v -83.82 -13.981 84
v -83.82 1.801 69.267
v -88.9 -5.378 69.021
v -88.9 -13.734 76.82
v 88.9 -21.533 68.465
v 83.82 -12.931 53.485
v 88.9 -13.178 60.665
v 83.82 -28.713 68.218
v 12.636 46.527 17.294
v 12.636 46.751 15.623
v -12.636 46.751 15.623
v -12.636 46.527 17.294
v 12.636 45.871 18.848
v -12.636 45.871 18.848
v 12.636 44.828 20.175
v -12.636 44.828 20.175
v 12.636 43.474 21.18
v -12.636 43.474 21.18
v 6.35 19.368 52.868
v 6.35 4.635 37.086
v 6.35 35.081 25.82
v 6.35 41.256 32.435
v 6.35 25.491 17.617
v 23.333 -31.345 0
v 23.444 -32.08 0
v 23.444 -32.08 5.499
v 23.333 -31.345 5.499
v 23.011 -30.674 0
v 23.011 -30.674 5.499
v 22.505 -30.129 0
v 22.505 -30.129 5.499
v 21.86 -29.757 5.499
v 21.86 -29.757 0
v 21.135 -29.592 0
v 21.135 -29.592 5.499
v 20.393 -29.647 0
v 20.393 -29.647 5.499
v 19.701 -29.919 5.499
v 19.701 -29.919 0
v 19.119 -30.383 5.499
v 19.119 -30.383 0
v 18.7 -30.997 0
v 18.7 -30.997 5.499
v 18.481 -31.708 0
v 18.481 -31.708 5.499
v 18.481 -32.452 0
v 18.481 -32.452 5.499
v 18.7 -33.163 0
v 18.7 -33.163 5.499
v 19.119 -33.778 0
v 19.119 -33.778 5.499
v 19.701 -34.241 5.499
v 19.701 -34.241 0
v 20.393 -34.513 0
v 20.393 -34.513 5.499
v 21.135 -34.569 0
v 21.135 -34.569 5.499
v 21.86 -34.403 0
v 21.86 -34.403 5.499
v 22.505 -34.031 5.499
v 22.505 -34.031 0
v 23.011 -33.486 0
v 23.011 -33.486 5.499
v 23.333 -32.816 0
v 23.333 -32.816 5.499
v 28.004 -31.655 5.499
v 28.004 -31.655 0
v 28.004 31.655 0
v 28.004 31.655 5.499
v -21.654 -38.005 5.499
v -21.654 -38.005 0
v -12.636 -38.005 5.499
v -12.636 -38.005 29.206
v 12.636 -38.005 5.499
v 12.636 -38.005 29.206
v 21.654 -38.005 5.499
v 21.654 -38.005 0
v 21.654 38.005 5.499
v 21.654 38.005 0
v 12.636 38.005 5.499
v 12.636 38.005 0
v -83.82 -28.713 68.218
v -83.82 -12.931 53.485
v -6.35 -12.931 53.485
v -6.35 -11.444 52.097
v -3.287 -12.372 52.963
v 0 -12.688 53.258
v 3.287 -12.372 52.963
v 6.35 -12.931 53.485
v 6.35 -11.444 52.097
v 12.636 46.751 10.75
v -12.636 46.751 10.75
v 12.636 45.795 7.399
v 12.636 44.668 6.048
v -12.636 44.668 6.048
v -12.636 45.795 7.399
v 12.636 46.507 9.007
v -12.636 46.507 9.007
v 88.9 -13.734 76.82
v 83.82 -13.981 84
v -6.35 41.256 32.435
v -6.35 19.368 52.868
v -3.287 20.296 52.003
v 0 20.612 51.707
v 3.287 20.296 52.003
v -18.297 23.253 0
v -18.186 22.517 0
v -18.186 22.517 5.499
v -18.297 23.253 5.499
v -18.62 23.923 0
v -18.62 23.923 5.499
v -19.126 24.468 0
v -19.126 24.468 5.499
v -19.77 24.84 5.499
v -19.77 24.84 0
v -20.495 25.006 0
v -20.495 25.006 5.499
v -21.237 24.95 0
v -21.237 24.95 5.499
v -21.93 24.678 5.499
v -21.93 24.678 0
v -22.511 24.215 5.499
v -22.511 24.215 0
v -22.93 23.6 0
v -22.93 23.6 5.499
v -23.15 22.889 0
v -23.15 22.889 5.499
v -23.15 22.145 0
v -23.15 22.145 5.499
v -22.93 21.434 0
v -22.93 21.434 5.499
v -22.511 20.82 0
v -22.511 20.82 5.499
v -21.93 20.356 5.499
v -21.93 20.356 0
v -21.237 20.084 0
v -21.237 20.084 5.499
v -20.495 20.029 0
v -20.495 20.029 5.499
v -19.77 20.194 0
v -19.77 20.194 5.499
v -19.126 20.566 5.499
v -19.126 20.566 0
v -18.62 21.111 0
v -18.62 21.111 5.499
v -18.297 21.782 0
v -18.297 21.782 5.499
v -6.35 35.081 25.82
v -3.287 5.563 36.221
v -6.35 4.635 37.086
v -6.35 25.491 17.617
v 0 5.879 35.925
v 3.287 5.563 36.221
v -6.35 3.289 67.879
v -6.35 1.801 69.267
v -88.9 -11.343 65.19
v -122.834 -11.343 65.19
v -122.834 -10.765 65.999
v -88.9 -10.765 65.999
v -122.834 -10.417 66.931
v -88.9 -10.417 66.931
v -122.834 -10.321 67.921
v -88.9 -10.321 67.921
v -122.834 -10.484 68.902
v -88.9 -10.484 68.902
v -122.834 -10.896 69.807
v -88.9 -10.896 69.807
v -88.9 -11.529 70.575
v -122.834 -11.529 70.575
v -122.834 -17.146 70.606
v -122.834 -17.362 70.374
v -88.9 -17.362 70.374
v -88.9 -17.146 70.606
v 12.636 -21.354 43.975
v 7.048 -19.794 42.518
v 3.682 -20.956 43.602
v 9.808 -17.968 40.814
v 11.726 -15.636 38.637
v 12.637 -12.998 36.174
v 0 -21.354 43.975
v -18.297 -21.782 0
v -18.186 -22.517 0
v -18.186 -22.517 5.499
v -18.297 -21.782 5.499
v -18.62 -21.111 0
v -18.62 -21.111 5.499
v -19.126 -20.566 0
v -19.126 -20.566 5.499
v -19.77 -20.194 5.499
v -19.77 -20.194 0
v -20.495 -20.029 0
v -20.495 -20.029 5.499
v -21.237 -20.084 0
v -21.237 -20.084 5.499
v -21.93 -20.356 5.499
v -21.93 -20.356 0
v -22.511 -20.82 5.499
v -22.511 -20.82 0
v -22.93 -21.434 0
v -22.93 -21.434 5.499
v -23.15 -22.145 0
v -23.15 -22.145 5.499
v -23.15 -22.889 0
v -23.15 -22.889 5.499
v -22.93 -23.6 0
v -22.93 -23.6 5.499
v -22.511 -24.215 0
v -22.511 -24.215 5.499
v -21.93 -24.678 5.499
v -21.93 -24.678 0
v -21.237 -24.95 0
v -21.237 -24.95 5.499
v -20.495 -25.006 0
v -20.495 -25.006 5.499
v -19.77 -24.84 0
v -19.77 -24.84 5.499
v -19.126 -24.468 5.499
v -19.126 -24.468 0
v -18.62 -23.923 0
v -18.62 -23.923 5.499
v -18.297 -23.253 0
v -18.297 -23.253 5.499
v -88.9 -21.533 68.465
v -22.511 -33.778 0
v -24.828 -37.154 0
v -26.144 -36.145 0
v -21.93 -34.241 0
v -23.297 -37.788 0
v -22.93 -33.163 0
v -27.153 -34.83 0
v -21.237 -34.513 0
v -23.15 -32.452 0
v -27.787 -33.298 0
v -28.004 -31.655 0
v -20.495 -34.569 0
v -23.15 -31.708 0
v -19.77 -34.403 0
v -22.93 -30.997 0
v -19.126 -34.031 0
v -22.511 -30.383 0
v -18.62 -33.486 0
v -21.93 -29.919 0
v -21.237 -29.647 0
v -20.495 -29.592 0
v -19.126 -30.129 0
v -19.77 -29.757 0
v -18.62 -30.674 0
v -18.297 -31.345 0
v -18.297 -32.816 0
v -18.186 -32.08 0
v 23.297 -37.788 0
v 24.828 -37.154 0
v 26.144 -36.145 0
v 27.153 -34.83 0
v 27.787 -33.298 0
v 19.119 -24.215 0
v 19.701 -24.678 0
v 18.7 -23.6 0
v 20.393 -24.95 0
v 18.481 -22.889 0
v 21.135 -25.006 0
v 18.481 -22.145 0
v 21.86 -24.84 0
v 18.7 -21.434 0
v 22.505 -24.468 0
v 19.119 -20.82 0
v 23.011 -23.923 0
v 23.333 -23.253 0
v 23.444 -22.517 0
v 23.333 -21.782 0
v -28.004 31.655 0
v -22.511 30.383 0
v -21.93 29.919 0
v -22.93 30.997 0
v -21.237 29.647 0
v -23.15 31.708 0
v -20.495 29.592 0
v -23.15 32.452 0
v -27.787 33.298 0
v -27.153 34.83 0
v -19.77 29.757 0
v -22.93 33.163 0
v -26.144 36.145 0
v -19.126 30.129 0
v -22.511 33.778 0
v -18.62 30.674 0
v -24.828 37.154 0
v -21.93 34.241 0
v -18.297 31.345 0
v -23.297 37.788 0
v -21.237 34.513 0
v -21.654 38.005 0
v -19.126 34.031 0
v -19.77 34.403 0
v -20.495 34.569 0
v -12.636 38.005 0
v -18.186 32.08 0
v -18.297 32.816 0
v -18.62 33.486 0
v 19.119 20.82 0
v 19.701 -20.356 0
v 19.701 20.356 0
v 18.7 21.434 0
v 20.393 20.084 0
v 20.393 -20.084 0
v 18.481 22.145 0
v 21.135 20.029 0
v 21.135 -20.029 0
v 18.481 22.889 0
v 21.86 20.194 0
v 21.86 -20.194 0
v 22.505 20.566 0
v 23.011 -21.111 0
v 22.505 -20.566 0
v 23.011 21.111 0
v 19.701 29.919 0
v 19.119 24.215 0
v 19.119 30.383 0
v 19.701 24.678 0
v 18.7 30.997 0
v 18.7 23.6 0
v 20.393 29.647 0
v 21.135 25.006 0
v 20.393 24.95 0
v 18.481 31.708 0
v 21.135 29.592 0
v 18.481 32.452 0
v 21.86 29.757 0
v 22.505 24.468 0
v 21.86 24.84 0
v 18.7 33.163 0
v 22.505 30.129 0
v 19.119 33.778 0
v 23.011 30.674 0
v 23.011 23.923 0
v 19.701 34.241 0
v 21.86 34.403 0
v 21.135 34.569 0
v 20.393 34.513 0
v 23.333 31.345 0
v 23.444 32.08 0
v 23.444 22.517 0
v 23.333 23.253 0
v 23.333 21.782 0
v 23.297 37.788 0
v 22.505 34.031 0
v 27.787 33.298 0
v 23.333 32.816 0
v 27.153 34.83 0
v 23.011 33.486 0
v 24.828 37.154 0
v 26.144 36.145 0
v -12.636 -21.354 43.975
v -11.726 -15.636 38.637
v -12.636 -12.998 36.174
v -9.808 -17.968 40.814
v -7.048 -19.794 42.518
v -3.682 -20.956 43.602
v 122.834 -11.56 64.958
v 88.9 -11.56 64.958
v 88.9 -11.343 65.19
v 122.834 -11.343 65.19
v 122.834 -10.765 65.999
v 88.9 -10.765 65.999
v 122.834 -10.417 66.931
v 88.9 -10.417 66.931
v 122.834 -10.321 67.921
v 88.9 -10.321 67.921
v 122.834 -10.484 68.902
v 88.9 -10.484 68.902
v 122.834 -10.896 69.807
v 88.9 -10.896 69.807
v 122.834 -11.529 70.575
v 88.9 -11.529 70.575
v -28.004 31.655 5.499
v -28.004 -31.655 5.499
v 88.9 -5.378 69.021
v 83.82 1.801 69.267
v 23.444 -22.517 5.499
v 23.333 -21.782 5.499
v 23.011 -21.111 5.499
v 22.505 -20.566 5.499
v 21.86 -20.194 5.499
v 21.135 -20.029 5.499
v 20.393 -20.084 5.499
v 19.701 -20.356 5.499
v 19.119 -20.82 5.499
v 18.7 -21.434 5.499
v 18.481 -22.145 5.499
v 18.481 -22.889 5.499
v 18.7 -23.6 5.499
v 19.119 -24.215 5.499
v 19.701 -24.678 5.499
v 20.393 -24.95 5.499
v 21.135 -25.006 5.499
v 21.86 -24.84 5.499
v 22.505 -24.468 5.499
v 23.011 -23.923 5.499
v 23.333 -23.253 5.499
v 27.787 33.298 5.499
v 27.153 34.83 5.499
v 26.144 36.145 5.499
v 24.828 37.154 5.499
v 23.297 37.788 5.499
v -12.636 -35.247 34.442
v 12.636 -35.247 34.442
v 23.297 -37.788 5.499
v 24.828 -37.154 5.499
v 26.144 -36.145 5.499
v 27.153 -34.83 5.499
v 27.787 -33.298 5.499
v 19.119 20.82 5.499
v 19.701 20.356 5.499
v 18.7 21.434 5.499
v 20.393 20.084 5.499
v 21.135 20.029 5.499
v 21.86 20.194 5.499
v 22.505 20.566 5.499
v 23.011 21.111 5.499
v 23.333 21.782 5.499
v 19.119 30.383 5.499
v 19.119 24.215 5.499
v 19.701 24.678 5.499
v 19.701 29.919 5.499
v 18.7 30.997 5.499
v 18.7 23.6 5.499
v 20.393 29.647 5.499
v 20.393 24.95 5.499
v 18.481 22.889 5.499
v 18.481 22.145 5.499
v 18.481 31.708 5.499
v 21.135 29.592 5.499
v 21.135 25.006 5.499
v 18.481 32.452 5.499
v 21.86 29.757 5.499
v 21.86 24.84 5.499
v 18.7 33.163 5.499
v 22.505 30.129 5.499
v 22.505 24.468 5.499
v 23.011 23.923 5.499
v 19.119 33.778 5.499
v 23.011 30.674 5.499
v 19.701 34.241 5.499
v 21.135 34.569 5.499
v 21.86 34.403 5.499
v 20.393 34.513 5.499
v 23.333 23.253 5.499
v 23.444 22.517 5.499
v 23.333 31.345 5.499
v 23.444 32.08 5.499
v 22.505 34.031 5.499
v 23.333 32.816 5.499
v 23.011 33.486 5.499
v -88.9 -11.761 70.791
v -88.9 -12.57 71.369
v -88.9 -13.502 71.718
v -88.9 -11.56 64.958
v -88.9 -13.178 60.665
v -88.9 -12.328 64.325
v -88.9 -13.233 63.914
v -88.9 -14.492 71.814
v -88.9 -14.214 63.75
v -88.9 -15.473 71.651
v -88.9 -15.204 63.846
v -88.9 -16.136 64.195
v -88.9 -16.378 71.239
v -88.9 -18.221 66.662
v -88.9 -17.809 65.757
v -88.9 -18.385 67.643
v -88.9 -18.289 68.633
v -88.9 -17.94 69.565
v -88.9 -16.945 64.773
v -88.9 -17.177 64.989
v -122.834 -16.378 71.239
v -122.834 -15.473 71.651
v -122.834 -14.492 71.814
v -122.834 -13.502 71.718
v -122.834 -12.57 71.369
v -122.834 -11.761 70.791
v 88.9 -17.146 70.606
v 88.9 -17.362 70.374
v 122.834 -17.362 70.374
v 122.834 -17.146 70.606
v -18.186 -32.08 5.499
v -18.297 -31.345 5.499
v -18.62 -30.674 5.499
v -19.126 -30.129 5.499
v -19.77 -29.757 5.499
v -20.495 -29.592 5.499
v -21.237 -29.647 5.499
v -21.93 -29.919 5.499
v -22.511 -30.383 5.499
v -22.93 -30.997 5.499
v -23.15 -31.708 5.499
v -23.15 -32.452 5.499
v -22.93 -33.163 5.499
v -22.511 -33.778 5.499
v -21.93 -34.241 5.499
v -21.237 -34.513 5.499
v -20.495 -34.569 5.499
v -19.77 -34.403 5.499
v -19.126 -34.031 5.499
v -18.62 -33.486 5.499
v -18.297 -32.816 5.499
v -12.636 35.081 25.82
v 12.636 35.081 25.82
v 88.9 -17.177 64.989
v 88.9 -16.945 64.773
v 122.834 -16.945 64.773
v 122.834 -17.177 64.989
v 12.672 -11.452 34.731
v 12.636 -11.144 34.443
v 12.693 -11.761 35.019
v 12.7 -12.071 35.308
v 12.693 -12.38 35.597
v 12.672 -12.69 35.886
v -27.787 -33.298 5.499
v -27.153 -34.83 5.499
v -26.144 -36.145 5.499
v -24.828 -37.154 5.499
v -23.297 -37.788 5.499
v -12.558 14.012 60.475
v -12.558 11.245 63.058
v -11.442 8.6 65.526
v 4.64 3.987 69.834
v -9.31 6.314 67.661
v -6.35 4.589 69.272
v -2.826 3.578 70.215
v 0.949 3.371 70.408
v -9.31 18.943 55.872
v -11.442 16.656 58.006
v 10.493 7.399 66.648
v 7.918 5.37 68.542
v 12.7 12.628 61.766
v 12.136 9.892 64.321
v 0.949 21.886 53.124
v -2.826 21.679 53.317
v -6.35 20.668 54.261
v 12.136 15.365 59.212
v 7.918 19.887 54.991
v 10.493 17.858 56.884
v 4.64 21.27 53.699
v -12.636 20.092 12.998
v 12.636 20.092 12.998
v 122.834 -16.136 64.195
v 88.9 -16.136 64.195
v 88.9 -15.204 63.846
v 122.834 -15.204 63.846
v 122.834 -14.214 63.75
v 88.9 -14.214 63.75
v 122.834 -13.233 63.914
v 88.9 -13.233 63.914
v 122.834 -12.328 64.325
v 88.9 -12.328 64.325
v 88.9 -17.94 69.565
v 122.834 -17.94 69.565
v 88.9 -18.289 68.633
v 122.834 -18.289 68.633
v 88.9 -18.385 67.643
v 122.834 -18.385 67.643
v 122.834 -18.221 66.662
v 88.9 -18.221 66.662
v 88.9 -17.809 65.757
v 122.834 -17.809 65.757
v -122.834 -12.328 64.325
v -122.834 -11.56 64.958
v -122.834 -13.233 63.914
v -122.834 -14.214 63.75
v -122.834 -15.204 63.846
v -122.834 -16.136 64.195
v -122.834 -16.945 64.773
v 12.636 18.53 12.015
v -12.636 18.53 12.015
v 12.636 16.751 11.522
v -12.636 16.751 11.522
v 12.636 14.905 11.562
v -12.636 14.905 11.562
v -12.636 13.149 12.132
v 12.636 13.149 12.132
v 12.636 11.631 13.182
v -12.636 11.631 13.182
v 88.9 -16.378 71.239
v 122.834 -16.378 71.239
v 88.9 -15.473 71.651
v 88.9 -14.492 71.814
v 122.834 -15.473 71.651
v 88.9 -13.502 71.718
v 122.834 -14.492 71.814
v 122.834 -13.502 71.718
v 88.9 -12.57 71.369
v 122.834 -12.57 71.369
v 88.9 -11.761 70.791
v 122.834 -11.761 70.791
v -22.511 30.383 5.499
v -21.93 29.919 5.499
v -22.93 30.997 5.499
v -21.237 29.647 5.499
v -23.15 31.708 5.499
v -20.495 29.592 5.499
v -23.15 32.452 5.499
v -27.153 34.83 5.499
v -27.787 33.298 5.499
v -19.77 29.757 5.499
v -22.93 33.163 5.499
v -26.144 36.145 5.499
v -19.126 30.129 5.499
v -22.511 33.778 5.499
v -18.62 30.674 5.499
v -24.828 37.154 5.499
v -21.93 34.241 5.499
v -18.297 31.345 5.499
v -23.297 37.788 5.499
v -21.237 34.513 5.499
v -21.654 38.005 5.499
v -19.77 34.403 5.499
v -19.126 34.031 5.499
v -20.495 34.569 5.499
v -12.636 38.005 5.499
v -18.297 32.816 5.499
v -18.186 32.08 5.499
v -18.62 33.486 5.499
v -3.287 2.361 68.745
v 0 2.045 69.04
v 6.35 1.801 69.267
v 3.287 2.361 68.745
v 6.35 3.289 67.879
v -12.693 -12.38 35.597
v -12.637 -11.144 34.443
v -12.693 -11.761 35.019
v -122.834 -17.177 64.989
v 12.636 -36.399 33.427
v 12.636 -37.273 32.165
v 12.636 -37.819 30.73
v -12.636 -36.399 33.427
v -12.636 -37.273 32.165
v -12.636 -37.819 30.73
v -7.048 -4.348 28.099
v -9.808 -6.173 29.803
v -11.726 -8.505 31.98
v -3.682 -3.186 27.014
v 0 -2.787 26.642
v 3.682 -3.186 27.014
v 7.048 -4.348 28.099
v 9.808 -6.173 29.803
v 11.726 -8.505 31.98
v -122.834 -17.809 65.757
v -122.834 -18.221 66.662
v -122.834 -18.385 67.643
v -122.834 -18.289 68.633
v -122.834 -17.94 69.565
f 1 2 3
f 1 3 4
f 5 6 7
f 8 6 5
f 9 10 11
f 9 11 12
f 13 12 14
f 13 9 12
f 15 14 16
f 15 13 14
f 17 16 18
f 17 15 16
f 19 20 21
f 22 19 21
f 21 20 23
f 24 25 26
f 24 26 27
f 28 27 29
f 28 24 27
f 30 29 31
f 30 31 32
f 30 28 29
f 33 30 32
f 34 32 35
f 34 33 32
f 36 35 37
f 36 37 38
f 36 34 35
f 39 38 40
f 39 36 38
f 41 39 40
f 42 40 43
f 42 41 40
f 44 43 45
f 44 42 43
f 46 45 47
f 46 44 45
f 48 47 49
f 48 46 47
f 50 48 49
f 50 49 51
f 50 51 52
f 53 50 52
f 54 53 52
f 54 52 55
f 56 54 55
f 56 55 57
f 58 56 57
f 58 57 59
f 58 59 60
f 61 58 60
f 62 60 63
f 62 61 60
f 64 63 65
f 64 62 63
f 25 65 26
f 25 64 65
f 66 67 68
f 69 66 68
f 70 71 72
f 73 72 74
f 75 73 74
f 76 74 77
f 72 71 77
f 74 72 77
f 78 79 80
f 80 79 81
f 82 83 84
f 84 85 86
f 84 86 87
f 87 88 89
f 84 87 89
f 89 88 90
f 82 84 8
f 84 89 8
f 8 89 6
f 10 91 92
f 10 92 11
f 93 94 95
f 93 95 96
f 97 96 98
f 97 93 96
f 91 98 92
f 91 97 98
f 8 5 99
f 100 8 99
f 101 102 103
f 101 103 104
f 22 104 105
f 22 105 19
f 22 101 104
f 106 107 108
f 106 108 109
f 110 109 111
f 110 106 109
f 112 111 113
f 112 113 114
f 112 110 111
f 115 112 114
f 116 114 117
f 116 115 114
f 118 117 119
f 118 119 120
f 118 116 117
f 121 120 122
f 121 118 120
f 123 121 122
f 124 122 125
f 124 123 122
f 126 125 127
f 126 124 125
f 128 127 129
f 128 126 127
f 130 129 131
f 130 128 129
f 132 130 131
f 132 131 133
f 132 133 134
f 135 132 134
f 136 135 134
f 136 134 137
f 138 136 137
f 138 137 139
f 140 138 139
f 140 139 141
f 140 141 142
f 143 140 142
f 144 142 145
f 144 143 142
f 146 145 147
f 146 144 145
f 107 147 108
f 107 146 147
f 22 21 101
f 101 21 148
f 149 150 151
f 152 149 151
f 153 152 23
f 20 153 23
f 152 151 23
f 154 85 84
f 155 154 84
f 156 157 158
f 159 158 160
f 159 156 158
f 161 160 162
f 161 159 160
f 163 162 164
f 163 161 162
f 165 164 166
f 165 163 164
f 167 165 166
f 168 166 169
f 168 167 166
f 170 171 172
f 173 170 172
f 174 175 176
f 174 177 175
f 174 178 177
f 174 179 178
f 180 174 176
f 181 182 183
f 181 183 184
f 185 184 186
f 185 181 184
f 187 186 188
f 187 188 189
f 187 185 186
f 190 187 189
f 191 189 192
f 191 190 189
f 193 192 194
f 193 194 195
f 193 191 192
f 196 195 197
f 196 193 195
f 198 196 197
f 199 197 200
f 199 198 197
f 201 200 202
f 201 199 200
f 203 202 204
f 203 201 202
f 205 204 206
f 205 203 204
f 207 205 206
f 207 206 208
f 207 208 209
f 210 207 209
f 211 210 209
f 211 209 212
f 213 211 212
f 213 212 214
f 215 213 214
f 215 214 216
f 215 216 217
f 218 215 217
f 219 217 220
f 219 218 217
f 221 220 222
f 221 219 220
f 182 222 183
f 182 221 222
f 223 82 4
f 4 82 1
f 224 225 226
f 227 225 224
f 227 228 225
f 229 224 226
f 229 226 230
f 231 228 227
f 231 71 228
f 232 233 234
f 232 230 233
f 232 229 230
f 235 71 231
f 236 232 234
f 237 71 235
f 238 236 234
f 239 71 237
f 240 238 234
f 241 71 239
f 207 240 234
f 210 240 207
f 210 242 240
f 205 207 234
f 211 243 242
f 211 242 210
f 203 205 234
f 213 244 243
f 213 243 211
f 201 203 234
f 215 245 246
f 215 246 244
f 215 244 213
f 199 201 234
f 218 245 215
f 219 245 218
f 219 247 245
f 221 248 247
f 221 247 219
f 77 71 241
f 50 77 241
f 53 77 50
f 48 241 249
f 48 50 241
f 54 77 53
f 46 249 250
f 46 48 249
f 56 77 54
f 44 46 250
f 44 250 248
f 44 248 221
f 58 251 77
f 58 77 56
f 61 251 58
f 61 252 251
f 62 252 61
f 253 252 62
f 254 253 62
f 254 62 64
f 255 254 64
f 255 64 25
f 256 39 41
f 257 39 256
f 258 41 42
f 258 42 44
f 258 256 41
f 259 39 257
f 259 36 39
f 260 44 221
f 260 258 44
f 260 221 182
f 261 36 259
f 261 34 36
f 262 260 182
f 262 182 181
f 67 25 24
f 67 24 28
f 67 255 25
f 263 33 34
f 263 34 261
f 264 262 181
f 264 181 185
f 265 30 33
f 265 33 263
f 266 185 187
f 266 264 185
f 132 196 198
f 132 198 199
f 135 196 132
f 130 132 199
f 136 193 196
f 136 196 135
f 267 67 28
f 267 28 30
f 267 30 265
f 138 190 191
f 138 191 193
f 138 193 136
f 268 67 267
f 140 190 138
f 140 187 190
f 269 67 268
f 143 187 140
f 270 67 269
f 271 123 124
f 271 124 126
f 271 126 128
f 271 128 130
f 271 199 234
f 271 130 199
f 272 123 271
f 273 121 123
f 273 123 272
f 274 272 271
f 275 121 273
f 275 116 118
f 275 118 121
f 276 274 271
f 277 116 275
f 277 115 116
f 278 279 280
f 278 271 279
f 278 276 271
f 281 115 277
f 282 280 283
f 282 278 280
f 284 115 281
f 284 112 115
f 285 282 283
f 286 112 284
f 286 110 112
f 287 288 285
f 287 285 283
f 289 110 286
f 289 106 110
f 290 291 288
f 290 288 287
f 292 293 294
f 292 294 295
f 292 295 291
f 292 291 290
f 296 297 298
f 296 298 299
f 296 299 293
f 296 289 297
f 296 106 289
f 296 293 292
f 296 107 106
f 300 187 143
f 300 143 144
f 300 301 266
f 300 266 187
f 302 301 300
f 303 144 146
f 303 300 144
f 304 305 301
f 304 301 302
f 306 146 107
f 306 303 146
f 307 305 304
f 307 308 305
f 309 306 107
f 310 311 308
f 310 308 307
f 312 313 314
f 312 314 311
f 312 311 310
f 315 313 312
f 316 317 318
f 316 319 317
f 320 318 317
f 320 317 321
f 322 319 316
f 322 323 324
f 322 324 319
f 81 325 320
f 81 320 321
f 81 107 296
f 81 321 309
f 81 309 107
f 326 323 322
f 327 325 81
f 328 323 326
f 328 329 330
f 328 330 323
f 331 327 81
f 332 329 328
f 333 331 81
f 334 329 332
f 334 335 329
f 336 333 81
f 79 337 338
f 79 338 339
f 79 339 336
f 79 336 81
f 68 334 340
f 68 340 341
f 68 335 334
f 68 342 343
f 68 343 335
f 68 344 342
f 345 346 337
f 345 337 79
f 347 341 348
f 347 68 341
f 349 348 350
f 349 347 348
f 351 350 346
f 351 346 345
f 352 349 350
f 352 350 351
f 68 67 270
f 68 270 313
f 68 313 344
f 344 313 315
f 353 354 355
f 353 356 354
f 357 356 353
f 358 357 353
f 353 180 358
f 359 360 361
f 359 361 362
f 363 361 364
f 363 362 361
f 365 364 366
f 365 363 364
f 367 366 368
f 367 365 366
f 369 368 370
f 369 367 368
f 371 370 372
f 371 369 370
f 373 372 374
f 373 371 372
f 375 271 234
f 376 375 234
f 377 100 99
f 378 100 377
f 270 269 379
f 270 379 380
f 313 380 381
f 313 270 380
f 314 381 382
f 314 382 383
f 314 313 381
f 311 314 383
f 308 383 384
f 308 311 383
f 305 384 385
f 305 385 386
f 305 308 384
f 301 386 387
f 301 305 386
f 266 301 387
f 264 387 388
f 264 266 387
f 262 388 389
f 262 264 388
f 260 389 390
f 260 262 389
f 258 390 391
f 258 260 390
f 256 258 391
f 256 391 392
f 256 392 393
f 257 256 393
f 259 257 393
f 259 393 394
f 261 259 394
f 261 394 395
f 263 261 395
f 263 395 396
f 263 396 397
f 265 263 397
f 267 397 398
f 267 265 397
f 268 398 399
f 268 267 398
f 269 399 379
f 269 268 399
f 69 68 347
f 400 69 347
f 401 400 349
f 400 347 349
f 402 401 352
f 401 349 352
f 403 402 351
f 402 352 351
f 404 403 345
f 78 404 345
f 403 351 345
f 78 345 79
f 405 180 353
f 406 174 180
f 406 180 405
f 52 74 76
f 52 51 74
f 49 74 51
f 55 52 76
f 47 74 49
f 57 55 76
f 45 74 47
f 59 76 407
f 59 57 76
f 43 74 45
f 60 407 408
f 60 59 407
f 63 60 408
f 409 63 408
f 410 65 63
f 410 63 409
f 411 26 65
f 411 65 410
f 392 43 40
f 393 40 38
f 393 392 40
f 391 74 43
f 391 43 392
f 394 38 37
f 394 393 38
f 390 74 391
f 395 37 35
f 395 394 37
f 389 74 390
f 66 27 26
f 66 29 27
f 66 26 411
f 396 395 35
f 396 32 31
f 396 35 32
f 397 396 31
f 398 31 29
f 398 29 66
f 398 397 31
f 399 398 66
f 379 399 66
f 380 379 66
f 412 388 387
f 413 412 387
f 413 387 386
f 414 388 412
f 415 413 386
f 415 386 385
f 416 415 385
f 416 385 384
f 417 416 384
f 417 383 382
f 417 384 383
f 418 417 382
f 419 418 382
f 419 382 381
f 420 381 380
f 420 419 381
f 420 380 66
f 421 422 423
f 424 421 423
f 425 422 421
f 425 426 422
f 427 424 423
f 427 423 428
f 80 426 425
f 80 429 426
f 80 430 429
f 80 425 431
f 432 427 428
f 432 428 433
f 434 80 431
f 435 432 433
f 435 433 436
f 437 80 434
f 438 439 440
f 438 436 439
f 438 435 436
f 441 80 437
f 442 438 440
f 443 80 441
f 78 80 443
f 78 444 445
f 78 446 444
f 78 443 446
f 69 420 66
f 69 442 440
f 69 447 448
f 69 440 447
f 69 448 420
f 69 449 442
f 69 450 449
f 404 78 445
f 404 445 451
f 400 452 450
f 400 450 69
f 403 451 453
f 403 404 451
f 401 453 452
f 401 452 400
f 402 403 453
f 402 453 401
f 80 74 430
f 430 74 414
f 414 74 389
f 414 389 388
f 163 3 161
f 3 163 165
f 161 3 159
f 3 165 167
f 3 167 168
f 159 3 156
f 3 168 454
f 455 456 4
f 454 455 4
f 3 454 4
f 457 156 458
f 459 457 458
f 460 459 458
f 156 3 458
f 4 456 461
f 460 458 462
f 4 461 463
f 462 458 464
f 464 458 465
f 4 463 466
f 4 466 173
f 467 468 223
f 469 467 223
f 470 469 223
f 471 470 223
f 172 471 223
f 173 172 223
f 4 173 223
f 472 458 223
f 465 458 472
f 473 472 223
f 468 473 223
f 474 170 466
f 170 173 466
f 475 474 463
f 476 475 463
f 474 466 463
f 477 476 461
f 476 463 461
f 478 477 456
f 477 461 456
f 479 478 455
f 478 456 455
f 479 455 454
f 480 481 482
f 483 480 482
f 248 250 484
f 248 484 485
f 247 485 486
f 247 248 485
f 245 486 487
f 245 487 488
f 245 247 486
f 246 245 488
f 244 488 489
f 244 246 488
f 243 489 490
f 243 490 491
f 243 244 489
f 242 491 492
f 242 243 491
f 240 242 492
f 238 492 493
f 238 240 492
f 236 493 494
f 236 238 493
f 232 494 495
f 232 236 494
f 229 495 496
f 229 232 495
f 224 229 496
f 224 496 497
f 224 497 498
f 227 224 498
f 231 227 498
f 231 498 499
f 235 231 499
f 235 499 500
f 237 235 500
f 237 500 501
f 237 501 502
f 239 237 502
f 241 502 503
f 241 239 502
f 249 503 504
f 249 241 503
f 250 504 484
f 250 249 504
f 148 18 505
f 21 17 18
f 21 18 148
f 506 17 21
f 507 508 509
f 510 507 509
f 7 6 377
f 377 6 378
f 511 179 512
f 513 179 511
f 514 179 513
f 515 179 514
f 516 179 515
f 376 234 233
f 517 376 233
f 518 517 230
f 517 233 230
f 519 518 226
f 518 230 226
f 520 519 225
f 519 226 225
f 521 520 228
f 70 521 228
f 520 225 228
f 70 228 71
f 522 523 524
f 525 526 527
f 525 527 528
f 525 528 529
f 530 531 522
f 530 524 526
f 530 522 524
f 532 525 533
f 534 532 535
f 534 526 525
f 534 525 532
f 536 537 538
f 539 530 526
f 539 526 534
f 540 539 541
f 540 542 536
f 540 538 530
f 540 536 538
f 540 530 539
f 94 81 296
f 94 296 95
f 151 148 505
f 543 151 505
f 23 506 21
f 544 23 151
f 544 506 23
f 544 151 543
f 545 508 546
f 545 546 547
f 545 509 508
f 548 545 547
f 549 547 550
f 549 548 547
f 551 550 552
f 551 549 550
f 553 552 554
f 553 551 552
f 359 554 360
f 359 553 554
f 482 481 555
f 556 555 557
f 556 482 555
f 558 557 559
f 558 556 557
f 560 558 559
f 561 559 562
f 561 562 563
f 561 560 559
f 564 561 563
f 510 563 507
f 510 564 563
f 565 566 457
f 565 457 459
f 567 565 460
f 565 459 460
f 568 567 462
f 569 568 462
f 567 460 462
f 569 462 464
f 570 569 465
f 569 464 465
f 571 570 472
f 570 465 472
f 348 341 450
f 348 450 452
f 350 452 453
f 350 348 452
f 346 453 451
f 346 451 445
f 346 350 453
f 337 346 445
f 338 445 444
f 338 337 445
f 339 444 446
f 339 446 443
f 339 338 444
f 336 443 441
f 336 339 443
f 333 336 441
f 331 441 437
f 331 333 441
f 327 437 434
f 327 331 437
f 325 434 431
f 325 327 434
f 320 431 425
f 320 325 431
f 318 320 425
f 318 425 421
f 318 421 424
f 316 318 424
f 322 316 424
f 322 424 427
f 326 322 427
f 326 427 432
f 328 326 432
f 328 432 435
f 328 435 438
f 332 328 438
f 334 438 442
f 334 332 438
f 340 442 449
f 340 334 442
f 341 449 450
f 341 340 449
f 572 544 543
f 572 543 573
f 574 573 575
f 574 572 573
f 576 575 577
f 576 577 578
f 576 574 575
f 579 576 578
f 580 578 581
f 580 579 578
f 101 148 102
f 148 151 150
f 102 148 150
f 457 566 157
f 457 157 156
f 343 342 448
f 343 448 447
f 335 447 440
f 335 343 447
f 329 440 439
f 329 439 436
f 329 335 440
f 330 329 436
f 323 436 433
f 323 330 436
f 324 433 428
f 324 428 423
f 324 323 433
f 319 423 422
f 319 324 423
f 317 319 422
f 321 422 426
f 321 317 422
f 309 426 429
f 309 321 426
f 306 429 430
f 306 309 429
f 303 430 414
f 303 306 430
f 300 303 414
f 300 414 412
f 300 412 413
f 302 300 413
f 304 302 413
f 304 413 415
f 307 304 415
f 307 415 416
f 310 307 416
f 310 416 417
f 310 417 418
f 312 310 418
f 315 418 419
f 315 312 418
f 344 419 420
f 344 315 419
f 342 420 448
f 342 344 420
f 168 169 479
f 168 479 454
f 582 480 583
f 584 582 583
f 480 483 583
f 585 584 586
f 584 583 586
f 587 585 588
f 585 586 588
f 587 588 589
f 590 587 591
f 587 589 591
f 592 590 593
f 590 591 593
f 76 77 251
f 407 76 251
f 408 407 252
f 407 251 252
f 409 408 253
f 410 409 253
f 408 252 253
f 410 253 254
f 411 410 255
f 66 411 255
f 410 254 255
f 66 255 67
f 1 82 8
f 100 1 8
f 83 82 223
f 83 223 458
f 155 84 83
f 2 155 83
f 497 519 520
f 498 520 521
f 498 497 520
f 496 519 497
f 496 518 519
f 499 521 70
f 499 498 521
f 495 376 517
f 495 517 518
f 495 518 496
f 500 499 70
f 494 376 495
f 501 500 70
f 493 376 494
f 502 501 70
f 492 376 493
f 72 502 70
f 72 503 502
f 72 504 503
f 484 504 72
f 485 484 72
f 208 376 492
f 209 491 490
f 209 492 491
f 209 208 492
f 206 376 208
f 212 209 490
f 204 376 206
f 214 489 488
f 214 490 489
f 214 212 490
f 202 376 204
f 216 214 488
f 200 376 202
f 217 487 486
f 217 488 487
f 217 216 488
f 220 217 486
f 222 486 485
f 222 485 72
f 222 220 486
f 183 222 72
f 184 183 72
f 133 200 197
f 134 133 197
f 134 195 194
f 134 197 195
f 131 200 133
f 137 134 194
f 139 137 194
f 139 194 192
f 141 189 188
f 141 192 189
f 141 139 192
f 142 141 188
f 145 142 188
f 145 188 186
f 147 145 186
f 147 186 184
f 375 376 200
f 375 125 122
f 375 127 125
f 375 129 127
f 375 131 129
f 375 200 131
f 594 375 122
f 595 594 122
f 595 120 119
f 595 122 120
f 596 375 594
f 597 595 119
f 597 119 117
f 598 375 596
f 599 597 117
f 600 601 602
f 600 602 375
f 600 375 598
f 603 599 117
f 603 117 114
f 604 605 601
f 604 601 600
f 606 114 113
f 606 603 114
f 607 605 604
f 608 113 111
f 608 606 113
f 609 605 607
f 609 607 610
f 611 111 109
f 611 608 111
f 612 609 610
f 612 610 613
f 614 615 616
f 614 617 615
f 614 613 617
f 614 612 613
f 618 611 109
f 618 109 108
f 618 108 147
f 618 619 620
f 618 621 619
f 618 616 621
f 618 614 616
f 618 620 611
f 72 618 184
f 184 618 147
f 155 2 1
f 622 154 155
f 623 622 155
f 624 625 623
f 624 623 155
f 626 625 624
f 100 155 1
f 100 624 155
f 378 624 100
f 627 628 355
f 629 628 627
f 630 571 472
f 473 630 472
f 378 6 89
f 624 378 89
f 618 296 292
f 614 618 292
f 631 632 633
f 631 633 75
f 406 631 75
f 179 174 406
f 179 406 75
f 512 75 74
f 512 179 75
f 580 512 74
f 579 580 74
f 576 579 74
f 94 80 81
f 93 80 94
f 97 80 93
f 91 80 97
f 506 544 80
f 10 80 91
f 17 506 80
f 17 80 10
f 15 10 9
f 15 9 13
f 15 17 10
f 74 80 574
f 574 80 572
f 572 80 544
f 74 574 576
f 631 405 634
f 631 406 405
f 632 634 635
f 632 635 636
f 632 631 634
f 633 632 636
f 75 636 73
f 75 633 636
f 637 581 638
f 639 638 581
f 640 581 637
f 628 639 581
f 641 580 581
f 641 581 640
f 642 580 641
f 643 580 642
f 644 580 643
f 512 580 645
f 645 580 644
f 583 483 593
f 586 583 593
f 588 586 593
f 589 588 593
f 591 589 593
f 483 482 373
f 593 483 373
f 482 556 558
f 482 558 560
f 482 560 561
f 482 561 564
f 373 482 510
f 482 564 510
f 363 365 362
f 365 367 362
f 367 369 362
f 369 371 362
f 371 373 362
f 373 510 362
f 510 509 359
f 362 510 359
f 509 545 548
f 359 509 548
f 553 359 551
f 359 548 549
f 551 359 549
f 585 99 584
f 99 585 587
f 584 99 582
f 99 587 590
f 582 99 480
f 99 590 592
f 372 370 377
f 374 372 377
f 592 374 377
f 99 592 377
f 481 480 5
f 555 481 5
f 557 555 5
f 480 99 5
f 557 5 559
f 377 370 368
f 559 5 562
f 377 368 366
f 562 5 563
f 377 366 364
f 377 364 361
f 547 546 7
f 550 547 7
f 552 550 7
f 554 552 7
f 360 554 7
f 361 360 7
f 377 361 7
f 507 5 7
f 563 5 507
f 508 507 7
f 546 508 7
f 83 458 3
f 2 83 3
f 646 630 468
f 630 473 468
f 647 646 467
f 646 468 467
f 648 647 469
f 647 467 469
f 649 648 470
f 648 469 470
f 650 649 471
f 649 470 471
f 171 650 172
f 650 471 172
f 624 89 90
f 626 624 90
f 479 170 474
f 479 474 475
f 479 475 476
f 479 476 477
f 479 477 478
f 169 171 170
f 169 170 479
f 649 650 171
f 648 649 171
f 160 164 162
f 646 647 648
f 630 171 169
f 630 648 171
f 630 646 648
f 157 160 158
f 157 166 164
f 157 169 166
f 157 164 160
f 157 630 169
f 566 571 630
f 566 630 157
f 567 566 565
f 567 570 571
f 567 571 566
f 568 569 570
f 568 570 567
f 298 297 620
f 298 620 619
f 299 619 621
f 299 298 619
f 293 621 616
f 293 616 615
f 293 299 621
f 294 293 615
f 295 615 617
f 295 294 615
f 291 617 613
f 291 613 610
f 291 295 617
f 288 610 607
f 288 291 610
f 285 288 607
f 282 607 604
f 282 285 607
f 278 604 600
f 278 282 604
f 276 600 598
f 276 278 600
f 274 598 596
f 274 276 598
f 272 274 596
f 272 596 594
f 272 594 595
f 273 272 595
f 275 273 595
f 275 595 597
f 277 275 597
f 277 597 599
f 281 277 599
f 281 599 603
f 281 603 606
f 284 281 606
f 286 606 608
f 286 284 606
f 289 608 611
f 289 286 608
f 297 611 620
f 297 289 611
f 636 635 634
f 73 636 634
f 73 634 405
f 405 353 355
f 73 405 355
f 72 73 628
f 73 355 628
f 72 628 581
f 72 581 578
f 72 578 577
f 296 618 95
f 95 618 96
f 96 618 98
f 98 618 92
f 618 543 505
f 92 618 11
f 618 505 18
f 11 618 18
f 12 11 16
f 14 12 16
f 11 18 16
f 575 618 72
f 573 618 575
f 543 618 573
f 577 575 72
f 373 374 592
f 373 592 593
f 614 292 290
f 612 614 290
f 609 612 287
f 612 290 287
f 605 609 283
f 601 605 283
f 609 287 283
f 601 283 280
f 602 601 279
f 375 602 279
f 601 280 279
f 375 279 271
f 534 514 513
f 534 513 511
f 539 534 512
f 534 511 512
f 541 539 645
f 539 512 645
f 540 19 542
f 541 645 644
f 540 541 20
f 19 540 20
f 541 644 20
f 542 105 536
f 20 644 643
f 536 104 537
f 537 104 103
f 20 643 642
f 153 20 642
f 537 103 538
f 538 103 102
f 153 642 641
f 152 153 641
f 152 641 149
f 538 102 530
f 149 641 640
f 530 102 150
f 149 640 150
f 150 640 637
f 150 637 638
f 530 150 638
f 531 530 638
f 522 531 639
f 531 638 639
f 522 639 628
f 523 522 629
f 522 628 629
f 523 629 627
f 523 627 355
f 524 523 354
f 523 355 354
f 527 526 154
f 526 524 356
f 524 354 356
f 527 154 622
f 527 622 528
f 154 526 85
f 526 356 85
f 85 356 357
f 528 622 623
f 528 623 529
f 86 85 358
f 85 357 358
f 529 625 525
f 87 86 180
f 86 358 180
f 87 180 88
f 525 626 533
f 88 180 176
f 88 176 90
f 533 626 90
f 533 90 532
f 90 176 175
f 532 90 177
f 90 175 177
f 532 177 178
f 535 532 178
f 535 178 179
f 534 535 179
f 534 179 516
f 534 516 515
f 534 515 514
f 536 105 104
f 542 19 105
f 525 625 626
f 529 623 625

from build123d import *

# Parameters (mm, degrees)
F0_R      = 2.49555
F1_DEPTH  = 5.4991
F3_DEPTH  = 12.6365
F4_R      = 12.7
F5_DEPTH  = 36.195
F8_DEPTH  = 21.59
F7_W      = 33.9344
F7_H      = 7.9375
F9_DEPTH  = 13.4493
F10_DEPTH = 5.5118
F11_SIZE  = 5.08
F12_R     = 3.81


with BuildPart() as f1:
    # F0 (on Top) → F1 (new body)
    with BuildSketch(Plane.XY):
        with BuildLine():
            Line((21.6535, 38.00475), (-21.6535, 38.00475))
            ThreePointArc((-21.6535, 38.00475), (-26.1436280605, 36.1448780605), (-28.0035, 31.65475))
            Line((-28.0035, 31.65475), (-28.0035, -31.65475))
            ThreePointArc((-28.0035, -31.65475), (-26.1436280605, -36.1448780605), (-21.6535, -38.00475))
            Line((-21.6535, -38.00475), (21.6535, -38.00475))
            ThreePointArc((21.6535, -38.00475), (26.1436280605, -36.1448780605), (28.0035, -31.65475))
            Line((28.0035, -31.65475), (28.0035, 31.65475))
            ThreePointArc((28.0035, 31.65475), (26.1436280605, 36.1448780605), (21.6535, 38.00475))
        make_face()
        with Locations((-20.68195, -32.0802)):
            Circle(F0_R, mode=Mode.SUBTRACT)
        with Locations((-20.68195, -22.5171)):
            Circle(F0_R, mode=Mode.SUBTRACT)
        with Locations((20.94865, -32.0802)):
            Circle(F0_R, mode=Mode.SUBTRACT)
        with Locations((20.94865, -22.5171)):
            Circle(F0_R, mode=Mode.SUBTRACT)
        with Locations((-20.68195, 22.5171)):
            Circle(F0_R, mode=Mode.SUBTRACT)
        with Locations((-20.68195, 32.0802)):
            Circle(F0_R, mode=Mode.SUBTRACT)
        with Locations((20.94865, 22.5171)):
            Circle(F0_R, mode=Mode.SUBTRACT)
        with Locations((20.94865, 32.0802)):
            Circle(F0_R, mode=Mode.SUBTRACT)
    extrude(amount=F1_DEPTH)

    # F2 (on Right) → F3 (join, symmetric)
    with BuildSketch(Plane.YZ):
        with BuildLine():
            Line((-38.00475, 0), (38.00475, 0))
            Line((38.00475, 0), (44.6684117025, 6.0475273605))
            ThreePointArc((44.6684117025, 6.0475273605), (46.2070110218, 8.1783938925), (46.7509385842, 10.7497792875))
            Line((46.7509385842, 10.7497792875), (46.7509385842, 15.6225843746))
            ThreePointArc((46.7509385842, 15.6225843746), (45.8705955509, 18.8483172628), (43.4736621539, 21.1796402376))
            Line((43.4736621539, 21.1796402376), (35.0811212719, 25.8202194964))
            Line((35.0811212719, 25.8202194964), (20.0922738228, 12.9981952029))
            ThreePointArc((20.0922738228, 12.9981952029), (15.826745806, 11.4750322558), (11.6312994892, 13.1817791111))
            Line((11.6312994892, 13.1817791111), (-21.3543212783, 43.9746556756))
            Line((-21.3543212783, 43.9746556756), (-35.2473775709, 34.4420485715))
            ThreePointArc((-35.2473775709, 34.4420485715), (-37.2732767231, 32.1648917383), (-38.00475, 29.2060646967))
            Line((-38.00475, 29.2060646967), (-38.00475, 0))
        make_face()
    extrude(amount=F3_DEPTH, both=True)

    # F4 (on face) → F5 (join)
    with BuildSketch(Plane(origin=(0, 11.9915573283, 12.8454696856), x_dir=(1, 0, 0), z_dir=(0, 0.6823928283, 0.7309856551))):
        with Locations((0, -32.9176921867)):
            Circle(F4_R)
    extrude(amount=F5_DEPTH)

    # F7 (on offset) → F8 (join)
    with BuildSketch(Plane(origin=(0, 20.6579462472, 22.1289875052), x_dir=(1, 0, 0), z_dir=(0, 0.6823928283, 0.7309856551))):
        Polygon((6.35, 5.7192138057), (6.35, 8.0242638057), (-6.35, 8.0242638057), (-6.35, 5.7192138057), (-6.35, -45.9507361943), (-57.15, -45.9507361943), (-88.9, -45.9507361943), (-88.9, -52.7769861943), (-88.9, -60.7144861943), (-88.9, -67.5407361943), (0, -67.5407361943), (88.9, -67.5407361943), (88.9, -60.7144861943), (88.9, -52.7769861943), (88.9, -45.9507361943), (57.15, -45.9507361943), (6.35, -45.9507361943), align=None)
    extrude(amount=F8_DEPTH)

    # F7 (on offset) → F9 (join)
    with BuildSketch(Plane(origin=(0, 20.6579462472, 22.1289875052), x_dir=(1, 0, 0), z_dir=(0, 0.6823928283, 0.7309856551))):
        with Locations((105.8672, -56.7457361943)):
            Rectangle(F7_W, F7_H)
        with Locations((-105.8672, -56.7457361943)):
            Rectangle(F7_W, F7_H)
    extrude(amount=F9_DEPTH)

    # F7 (on offset) → F10 (cut)
    with BuildSketch(Plane(origin=(0, 20.6579462472, 22.1289875052), x_dir=(1, 0, 0), z_dir=(0, 0.6823928283, 0.7309856551))):
        with Locations((105.8672, -56.7457361943)):
            Rectangle(F7_W, F7_H)
        with Locations((-105.8672, -56.7457361943)):
            Rectangle(F7_W, F7_H)
    extrude(amount=F10_DEPTH, mode=Mode.SUBTRACT)

    # F11
    f11_edges = [f1.edges().sort_by_distance(p)[0] for p in [
        (88.9, -21.346932, 76.109292),
        (88.9, -6.089512, 76.633851),
        (88.9, -5.564952, 61.37643),
        (88.9, -20.822373, 60.851871),
        (-88.9, -6.089512, 76.633851),
        (-88.9, -21.346932, 76.109292),
        (-88.9, -5.564952, 61.37643),
        (-88.9, -20.822373, 60.851871),
    ]]
    chamfer(f11_edges, length=F11_SIZE)

    # F12
    f12_edges = [f1.edges().sort_by_distance(p)[0] for p in [
        (105.8672, -14.545766, 73.391363),
        (105.8672, -19.962259, 67.589164),
        (105.8672, -14.160061, 62.172671),
        (105.8672, -8.743568, 67.97487),
        (-105.8672, -19.962259, 67.589164),
        (-105.8672, -14.545766, 73.391363),
        (-105.8672, -8.743568, 67.97487),
        (-105.8672, -14.160061, 62.172671),
    ]]
    fillet(f12_edges, radius=F12_R)


solid = f1.part
